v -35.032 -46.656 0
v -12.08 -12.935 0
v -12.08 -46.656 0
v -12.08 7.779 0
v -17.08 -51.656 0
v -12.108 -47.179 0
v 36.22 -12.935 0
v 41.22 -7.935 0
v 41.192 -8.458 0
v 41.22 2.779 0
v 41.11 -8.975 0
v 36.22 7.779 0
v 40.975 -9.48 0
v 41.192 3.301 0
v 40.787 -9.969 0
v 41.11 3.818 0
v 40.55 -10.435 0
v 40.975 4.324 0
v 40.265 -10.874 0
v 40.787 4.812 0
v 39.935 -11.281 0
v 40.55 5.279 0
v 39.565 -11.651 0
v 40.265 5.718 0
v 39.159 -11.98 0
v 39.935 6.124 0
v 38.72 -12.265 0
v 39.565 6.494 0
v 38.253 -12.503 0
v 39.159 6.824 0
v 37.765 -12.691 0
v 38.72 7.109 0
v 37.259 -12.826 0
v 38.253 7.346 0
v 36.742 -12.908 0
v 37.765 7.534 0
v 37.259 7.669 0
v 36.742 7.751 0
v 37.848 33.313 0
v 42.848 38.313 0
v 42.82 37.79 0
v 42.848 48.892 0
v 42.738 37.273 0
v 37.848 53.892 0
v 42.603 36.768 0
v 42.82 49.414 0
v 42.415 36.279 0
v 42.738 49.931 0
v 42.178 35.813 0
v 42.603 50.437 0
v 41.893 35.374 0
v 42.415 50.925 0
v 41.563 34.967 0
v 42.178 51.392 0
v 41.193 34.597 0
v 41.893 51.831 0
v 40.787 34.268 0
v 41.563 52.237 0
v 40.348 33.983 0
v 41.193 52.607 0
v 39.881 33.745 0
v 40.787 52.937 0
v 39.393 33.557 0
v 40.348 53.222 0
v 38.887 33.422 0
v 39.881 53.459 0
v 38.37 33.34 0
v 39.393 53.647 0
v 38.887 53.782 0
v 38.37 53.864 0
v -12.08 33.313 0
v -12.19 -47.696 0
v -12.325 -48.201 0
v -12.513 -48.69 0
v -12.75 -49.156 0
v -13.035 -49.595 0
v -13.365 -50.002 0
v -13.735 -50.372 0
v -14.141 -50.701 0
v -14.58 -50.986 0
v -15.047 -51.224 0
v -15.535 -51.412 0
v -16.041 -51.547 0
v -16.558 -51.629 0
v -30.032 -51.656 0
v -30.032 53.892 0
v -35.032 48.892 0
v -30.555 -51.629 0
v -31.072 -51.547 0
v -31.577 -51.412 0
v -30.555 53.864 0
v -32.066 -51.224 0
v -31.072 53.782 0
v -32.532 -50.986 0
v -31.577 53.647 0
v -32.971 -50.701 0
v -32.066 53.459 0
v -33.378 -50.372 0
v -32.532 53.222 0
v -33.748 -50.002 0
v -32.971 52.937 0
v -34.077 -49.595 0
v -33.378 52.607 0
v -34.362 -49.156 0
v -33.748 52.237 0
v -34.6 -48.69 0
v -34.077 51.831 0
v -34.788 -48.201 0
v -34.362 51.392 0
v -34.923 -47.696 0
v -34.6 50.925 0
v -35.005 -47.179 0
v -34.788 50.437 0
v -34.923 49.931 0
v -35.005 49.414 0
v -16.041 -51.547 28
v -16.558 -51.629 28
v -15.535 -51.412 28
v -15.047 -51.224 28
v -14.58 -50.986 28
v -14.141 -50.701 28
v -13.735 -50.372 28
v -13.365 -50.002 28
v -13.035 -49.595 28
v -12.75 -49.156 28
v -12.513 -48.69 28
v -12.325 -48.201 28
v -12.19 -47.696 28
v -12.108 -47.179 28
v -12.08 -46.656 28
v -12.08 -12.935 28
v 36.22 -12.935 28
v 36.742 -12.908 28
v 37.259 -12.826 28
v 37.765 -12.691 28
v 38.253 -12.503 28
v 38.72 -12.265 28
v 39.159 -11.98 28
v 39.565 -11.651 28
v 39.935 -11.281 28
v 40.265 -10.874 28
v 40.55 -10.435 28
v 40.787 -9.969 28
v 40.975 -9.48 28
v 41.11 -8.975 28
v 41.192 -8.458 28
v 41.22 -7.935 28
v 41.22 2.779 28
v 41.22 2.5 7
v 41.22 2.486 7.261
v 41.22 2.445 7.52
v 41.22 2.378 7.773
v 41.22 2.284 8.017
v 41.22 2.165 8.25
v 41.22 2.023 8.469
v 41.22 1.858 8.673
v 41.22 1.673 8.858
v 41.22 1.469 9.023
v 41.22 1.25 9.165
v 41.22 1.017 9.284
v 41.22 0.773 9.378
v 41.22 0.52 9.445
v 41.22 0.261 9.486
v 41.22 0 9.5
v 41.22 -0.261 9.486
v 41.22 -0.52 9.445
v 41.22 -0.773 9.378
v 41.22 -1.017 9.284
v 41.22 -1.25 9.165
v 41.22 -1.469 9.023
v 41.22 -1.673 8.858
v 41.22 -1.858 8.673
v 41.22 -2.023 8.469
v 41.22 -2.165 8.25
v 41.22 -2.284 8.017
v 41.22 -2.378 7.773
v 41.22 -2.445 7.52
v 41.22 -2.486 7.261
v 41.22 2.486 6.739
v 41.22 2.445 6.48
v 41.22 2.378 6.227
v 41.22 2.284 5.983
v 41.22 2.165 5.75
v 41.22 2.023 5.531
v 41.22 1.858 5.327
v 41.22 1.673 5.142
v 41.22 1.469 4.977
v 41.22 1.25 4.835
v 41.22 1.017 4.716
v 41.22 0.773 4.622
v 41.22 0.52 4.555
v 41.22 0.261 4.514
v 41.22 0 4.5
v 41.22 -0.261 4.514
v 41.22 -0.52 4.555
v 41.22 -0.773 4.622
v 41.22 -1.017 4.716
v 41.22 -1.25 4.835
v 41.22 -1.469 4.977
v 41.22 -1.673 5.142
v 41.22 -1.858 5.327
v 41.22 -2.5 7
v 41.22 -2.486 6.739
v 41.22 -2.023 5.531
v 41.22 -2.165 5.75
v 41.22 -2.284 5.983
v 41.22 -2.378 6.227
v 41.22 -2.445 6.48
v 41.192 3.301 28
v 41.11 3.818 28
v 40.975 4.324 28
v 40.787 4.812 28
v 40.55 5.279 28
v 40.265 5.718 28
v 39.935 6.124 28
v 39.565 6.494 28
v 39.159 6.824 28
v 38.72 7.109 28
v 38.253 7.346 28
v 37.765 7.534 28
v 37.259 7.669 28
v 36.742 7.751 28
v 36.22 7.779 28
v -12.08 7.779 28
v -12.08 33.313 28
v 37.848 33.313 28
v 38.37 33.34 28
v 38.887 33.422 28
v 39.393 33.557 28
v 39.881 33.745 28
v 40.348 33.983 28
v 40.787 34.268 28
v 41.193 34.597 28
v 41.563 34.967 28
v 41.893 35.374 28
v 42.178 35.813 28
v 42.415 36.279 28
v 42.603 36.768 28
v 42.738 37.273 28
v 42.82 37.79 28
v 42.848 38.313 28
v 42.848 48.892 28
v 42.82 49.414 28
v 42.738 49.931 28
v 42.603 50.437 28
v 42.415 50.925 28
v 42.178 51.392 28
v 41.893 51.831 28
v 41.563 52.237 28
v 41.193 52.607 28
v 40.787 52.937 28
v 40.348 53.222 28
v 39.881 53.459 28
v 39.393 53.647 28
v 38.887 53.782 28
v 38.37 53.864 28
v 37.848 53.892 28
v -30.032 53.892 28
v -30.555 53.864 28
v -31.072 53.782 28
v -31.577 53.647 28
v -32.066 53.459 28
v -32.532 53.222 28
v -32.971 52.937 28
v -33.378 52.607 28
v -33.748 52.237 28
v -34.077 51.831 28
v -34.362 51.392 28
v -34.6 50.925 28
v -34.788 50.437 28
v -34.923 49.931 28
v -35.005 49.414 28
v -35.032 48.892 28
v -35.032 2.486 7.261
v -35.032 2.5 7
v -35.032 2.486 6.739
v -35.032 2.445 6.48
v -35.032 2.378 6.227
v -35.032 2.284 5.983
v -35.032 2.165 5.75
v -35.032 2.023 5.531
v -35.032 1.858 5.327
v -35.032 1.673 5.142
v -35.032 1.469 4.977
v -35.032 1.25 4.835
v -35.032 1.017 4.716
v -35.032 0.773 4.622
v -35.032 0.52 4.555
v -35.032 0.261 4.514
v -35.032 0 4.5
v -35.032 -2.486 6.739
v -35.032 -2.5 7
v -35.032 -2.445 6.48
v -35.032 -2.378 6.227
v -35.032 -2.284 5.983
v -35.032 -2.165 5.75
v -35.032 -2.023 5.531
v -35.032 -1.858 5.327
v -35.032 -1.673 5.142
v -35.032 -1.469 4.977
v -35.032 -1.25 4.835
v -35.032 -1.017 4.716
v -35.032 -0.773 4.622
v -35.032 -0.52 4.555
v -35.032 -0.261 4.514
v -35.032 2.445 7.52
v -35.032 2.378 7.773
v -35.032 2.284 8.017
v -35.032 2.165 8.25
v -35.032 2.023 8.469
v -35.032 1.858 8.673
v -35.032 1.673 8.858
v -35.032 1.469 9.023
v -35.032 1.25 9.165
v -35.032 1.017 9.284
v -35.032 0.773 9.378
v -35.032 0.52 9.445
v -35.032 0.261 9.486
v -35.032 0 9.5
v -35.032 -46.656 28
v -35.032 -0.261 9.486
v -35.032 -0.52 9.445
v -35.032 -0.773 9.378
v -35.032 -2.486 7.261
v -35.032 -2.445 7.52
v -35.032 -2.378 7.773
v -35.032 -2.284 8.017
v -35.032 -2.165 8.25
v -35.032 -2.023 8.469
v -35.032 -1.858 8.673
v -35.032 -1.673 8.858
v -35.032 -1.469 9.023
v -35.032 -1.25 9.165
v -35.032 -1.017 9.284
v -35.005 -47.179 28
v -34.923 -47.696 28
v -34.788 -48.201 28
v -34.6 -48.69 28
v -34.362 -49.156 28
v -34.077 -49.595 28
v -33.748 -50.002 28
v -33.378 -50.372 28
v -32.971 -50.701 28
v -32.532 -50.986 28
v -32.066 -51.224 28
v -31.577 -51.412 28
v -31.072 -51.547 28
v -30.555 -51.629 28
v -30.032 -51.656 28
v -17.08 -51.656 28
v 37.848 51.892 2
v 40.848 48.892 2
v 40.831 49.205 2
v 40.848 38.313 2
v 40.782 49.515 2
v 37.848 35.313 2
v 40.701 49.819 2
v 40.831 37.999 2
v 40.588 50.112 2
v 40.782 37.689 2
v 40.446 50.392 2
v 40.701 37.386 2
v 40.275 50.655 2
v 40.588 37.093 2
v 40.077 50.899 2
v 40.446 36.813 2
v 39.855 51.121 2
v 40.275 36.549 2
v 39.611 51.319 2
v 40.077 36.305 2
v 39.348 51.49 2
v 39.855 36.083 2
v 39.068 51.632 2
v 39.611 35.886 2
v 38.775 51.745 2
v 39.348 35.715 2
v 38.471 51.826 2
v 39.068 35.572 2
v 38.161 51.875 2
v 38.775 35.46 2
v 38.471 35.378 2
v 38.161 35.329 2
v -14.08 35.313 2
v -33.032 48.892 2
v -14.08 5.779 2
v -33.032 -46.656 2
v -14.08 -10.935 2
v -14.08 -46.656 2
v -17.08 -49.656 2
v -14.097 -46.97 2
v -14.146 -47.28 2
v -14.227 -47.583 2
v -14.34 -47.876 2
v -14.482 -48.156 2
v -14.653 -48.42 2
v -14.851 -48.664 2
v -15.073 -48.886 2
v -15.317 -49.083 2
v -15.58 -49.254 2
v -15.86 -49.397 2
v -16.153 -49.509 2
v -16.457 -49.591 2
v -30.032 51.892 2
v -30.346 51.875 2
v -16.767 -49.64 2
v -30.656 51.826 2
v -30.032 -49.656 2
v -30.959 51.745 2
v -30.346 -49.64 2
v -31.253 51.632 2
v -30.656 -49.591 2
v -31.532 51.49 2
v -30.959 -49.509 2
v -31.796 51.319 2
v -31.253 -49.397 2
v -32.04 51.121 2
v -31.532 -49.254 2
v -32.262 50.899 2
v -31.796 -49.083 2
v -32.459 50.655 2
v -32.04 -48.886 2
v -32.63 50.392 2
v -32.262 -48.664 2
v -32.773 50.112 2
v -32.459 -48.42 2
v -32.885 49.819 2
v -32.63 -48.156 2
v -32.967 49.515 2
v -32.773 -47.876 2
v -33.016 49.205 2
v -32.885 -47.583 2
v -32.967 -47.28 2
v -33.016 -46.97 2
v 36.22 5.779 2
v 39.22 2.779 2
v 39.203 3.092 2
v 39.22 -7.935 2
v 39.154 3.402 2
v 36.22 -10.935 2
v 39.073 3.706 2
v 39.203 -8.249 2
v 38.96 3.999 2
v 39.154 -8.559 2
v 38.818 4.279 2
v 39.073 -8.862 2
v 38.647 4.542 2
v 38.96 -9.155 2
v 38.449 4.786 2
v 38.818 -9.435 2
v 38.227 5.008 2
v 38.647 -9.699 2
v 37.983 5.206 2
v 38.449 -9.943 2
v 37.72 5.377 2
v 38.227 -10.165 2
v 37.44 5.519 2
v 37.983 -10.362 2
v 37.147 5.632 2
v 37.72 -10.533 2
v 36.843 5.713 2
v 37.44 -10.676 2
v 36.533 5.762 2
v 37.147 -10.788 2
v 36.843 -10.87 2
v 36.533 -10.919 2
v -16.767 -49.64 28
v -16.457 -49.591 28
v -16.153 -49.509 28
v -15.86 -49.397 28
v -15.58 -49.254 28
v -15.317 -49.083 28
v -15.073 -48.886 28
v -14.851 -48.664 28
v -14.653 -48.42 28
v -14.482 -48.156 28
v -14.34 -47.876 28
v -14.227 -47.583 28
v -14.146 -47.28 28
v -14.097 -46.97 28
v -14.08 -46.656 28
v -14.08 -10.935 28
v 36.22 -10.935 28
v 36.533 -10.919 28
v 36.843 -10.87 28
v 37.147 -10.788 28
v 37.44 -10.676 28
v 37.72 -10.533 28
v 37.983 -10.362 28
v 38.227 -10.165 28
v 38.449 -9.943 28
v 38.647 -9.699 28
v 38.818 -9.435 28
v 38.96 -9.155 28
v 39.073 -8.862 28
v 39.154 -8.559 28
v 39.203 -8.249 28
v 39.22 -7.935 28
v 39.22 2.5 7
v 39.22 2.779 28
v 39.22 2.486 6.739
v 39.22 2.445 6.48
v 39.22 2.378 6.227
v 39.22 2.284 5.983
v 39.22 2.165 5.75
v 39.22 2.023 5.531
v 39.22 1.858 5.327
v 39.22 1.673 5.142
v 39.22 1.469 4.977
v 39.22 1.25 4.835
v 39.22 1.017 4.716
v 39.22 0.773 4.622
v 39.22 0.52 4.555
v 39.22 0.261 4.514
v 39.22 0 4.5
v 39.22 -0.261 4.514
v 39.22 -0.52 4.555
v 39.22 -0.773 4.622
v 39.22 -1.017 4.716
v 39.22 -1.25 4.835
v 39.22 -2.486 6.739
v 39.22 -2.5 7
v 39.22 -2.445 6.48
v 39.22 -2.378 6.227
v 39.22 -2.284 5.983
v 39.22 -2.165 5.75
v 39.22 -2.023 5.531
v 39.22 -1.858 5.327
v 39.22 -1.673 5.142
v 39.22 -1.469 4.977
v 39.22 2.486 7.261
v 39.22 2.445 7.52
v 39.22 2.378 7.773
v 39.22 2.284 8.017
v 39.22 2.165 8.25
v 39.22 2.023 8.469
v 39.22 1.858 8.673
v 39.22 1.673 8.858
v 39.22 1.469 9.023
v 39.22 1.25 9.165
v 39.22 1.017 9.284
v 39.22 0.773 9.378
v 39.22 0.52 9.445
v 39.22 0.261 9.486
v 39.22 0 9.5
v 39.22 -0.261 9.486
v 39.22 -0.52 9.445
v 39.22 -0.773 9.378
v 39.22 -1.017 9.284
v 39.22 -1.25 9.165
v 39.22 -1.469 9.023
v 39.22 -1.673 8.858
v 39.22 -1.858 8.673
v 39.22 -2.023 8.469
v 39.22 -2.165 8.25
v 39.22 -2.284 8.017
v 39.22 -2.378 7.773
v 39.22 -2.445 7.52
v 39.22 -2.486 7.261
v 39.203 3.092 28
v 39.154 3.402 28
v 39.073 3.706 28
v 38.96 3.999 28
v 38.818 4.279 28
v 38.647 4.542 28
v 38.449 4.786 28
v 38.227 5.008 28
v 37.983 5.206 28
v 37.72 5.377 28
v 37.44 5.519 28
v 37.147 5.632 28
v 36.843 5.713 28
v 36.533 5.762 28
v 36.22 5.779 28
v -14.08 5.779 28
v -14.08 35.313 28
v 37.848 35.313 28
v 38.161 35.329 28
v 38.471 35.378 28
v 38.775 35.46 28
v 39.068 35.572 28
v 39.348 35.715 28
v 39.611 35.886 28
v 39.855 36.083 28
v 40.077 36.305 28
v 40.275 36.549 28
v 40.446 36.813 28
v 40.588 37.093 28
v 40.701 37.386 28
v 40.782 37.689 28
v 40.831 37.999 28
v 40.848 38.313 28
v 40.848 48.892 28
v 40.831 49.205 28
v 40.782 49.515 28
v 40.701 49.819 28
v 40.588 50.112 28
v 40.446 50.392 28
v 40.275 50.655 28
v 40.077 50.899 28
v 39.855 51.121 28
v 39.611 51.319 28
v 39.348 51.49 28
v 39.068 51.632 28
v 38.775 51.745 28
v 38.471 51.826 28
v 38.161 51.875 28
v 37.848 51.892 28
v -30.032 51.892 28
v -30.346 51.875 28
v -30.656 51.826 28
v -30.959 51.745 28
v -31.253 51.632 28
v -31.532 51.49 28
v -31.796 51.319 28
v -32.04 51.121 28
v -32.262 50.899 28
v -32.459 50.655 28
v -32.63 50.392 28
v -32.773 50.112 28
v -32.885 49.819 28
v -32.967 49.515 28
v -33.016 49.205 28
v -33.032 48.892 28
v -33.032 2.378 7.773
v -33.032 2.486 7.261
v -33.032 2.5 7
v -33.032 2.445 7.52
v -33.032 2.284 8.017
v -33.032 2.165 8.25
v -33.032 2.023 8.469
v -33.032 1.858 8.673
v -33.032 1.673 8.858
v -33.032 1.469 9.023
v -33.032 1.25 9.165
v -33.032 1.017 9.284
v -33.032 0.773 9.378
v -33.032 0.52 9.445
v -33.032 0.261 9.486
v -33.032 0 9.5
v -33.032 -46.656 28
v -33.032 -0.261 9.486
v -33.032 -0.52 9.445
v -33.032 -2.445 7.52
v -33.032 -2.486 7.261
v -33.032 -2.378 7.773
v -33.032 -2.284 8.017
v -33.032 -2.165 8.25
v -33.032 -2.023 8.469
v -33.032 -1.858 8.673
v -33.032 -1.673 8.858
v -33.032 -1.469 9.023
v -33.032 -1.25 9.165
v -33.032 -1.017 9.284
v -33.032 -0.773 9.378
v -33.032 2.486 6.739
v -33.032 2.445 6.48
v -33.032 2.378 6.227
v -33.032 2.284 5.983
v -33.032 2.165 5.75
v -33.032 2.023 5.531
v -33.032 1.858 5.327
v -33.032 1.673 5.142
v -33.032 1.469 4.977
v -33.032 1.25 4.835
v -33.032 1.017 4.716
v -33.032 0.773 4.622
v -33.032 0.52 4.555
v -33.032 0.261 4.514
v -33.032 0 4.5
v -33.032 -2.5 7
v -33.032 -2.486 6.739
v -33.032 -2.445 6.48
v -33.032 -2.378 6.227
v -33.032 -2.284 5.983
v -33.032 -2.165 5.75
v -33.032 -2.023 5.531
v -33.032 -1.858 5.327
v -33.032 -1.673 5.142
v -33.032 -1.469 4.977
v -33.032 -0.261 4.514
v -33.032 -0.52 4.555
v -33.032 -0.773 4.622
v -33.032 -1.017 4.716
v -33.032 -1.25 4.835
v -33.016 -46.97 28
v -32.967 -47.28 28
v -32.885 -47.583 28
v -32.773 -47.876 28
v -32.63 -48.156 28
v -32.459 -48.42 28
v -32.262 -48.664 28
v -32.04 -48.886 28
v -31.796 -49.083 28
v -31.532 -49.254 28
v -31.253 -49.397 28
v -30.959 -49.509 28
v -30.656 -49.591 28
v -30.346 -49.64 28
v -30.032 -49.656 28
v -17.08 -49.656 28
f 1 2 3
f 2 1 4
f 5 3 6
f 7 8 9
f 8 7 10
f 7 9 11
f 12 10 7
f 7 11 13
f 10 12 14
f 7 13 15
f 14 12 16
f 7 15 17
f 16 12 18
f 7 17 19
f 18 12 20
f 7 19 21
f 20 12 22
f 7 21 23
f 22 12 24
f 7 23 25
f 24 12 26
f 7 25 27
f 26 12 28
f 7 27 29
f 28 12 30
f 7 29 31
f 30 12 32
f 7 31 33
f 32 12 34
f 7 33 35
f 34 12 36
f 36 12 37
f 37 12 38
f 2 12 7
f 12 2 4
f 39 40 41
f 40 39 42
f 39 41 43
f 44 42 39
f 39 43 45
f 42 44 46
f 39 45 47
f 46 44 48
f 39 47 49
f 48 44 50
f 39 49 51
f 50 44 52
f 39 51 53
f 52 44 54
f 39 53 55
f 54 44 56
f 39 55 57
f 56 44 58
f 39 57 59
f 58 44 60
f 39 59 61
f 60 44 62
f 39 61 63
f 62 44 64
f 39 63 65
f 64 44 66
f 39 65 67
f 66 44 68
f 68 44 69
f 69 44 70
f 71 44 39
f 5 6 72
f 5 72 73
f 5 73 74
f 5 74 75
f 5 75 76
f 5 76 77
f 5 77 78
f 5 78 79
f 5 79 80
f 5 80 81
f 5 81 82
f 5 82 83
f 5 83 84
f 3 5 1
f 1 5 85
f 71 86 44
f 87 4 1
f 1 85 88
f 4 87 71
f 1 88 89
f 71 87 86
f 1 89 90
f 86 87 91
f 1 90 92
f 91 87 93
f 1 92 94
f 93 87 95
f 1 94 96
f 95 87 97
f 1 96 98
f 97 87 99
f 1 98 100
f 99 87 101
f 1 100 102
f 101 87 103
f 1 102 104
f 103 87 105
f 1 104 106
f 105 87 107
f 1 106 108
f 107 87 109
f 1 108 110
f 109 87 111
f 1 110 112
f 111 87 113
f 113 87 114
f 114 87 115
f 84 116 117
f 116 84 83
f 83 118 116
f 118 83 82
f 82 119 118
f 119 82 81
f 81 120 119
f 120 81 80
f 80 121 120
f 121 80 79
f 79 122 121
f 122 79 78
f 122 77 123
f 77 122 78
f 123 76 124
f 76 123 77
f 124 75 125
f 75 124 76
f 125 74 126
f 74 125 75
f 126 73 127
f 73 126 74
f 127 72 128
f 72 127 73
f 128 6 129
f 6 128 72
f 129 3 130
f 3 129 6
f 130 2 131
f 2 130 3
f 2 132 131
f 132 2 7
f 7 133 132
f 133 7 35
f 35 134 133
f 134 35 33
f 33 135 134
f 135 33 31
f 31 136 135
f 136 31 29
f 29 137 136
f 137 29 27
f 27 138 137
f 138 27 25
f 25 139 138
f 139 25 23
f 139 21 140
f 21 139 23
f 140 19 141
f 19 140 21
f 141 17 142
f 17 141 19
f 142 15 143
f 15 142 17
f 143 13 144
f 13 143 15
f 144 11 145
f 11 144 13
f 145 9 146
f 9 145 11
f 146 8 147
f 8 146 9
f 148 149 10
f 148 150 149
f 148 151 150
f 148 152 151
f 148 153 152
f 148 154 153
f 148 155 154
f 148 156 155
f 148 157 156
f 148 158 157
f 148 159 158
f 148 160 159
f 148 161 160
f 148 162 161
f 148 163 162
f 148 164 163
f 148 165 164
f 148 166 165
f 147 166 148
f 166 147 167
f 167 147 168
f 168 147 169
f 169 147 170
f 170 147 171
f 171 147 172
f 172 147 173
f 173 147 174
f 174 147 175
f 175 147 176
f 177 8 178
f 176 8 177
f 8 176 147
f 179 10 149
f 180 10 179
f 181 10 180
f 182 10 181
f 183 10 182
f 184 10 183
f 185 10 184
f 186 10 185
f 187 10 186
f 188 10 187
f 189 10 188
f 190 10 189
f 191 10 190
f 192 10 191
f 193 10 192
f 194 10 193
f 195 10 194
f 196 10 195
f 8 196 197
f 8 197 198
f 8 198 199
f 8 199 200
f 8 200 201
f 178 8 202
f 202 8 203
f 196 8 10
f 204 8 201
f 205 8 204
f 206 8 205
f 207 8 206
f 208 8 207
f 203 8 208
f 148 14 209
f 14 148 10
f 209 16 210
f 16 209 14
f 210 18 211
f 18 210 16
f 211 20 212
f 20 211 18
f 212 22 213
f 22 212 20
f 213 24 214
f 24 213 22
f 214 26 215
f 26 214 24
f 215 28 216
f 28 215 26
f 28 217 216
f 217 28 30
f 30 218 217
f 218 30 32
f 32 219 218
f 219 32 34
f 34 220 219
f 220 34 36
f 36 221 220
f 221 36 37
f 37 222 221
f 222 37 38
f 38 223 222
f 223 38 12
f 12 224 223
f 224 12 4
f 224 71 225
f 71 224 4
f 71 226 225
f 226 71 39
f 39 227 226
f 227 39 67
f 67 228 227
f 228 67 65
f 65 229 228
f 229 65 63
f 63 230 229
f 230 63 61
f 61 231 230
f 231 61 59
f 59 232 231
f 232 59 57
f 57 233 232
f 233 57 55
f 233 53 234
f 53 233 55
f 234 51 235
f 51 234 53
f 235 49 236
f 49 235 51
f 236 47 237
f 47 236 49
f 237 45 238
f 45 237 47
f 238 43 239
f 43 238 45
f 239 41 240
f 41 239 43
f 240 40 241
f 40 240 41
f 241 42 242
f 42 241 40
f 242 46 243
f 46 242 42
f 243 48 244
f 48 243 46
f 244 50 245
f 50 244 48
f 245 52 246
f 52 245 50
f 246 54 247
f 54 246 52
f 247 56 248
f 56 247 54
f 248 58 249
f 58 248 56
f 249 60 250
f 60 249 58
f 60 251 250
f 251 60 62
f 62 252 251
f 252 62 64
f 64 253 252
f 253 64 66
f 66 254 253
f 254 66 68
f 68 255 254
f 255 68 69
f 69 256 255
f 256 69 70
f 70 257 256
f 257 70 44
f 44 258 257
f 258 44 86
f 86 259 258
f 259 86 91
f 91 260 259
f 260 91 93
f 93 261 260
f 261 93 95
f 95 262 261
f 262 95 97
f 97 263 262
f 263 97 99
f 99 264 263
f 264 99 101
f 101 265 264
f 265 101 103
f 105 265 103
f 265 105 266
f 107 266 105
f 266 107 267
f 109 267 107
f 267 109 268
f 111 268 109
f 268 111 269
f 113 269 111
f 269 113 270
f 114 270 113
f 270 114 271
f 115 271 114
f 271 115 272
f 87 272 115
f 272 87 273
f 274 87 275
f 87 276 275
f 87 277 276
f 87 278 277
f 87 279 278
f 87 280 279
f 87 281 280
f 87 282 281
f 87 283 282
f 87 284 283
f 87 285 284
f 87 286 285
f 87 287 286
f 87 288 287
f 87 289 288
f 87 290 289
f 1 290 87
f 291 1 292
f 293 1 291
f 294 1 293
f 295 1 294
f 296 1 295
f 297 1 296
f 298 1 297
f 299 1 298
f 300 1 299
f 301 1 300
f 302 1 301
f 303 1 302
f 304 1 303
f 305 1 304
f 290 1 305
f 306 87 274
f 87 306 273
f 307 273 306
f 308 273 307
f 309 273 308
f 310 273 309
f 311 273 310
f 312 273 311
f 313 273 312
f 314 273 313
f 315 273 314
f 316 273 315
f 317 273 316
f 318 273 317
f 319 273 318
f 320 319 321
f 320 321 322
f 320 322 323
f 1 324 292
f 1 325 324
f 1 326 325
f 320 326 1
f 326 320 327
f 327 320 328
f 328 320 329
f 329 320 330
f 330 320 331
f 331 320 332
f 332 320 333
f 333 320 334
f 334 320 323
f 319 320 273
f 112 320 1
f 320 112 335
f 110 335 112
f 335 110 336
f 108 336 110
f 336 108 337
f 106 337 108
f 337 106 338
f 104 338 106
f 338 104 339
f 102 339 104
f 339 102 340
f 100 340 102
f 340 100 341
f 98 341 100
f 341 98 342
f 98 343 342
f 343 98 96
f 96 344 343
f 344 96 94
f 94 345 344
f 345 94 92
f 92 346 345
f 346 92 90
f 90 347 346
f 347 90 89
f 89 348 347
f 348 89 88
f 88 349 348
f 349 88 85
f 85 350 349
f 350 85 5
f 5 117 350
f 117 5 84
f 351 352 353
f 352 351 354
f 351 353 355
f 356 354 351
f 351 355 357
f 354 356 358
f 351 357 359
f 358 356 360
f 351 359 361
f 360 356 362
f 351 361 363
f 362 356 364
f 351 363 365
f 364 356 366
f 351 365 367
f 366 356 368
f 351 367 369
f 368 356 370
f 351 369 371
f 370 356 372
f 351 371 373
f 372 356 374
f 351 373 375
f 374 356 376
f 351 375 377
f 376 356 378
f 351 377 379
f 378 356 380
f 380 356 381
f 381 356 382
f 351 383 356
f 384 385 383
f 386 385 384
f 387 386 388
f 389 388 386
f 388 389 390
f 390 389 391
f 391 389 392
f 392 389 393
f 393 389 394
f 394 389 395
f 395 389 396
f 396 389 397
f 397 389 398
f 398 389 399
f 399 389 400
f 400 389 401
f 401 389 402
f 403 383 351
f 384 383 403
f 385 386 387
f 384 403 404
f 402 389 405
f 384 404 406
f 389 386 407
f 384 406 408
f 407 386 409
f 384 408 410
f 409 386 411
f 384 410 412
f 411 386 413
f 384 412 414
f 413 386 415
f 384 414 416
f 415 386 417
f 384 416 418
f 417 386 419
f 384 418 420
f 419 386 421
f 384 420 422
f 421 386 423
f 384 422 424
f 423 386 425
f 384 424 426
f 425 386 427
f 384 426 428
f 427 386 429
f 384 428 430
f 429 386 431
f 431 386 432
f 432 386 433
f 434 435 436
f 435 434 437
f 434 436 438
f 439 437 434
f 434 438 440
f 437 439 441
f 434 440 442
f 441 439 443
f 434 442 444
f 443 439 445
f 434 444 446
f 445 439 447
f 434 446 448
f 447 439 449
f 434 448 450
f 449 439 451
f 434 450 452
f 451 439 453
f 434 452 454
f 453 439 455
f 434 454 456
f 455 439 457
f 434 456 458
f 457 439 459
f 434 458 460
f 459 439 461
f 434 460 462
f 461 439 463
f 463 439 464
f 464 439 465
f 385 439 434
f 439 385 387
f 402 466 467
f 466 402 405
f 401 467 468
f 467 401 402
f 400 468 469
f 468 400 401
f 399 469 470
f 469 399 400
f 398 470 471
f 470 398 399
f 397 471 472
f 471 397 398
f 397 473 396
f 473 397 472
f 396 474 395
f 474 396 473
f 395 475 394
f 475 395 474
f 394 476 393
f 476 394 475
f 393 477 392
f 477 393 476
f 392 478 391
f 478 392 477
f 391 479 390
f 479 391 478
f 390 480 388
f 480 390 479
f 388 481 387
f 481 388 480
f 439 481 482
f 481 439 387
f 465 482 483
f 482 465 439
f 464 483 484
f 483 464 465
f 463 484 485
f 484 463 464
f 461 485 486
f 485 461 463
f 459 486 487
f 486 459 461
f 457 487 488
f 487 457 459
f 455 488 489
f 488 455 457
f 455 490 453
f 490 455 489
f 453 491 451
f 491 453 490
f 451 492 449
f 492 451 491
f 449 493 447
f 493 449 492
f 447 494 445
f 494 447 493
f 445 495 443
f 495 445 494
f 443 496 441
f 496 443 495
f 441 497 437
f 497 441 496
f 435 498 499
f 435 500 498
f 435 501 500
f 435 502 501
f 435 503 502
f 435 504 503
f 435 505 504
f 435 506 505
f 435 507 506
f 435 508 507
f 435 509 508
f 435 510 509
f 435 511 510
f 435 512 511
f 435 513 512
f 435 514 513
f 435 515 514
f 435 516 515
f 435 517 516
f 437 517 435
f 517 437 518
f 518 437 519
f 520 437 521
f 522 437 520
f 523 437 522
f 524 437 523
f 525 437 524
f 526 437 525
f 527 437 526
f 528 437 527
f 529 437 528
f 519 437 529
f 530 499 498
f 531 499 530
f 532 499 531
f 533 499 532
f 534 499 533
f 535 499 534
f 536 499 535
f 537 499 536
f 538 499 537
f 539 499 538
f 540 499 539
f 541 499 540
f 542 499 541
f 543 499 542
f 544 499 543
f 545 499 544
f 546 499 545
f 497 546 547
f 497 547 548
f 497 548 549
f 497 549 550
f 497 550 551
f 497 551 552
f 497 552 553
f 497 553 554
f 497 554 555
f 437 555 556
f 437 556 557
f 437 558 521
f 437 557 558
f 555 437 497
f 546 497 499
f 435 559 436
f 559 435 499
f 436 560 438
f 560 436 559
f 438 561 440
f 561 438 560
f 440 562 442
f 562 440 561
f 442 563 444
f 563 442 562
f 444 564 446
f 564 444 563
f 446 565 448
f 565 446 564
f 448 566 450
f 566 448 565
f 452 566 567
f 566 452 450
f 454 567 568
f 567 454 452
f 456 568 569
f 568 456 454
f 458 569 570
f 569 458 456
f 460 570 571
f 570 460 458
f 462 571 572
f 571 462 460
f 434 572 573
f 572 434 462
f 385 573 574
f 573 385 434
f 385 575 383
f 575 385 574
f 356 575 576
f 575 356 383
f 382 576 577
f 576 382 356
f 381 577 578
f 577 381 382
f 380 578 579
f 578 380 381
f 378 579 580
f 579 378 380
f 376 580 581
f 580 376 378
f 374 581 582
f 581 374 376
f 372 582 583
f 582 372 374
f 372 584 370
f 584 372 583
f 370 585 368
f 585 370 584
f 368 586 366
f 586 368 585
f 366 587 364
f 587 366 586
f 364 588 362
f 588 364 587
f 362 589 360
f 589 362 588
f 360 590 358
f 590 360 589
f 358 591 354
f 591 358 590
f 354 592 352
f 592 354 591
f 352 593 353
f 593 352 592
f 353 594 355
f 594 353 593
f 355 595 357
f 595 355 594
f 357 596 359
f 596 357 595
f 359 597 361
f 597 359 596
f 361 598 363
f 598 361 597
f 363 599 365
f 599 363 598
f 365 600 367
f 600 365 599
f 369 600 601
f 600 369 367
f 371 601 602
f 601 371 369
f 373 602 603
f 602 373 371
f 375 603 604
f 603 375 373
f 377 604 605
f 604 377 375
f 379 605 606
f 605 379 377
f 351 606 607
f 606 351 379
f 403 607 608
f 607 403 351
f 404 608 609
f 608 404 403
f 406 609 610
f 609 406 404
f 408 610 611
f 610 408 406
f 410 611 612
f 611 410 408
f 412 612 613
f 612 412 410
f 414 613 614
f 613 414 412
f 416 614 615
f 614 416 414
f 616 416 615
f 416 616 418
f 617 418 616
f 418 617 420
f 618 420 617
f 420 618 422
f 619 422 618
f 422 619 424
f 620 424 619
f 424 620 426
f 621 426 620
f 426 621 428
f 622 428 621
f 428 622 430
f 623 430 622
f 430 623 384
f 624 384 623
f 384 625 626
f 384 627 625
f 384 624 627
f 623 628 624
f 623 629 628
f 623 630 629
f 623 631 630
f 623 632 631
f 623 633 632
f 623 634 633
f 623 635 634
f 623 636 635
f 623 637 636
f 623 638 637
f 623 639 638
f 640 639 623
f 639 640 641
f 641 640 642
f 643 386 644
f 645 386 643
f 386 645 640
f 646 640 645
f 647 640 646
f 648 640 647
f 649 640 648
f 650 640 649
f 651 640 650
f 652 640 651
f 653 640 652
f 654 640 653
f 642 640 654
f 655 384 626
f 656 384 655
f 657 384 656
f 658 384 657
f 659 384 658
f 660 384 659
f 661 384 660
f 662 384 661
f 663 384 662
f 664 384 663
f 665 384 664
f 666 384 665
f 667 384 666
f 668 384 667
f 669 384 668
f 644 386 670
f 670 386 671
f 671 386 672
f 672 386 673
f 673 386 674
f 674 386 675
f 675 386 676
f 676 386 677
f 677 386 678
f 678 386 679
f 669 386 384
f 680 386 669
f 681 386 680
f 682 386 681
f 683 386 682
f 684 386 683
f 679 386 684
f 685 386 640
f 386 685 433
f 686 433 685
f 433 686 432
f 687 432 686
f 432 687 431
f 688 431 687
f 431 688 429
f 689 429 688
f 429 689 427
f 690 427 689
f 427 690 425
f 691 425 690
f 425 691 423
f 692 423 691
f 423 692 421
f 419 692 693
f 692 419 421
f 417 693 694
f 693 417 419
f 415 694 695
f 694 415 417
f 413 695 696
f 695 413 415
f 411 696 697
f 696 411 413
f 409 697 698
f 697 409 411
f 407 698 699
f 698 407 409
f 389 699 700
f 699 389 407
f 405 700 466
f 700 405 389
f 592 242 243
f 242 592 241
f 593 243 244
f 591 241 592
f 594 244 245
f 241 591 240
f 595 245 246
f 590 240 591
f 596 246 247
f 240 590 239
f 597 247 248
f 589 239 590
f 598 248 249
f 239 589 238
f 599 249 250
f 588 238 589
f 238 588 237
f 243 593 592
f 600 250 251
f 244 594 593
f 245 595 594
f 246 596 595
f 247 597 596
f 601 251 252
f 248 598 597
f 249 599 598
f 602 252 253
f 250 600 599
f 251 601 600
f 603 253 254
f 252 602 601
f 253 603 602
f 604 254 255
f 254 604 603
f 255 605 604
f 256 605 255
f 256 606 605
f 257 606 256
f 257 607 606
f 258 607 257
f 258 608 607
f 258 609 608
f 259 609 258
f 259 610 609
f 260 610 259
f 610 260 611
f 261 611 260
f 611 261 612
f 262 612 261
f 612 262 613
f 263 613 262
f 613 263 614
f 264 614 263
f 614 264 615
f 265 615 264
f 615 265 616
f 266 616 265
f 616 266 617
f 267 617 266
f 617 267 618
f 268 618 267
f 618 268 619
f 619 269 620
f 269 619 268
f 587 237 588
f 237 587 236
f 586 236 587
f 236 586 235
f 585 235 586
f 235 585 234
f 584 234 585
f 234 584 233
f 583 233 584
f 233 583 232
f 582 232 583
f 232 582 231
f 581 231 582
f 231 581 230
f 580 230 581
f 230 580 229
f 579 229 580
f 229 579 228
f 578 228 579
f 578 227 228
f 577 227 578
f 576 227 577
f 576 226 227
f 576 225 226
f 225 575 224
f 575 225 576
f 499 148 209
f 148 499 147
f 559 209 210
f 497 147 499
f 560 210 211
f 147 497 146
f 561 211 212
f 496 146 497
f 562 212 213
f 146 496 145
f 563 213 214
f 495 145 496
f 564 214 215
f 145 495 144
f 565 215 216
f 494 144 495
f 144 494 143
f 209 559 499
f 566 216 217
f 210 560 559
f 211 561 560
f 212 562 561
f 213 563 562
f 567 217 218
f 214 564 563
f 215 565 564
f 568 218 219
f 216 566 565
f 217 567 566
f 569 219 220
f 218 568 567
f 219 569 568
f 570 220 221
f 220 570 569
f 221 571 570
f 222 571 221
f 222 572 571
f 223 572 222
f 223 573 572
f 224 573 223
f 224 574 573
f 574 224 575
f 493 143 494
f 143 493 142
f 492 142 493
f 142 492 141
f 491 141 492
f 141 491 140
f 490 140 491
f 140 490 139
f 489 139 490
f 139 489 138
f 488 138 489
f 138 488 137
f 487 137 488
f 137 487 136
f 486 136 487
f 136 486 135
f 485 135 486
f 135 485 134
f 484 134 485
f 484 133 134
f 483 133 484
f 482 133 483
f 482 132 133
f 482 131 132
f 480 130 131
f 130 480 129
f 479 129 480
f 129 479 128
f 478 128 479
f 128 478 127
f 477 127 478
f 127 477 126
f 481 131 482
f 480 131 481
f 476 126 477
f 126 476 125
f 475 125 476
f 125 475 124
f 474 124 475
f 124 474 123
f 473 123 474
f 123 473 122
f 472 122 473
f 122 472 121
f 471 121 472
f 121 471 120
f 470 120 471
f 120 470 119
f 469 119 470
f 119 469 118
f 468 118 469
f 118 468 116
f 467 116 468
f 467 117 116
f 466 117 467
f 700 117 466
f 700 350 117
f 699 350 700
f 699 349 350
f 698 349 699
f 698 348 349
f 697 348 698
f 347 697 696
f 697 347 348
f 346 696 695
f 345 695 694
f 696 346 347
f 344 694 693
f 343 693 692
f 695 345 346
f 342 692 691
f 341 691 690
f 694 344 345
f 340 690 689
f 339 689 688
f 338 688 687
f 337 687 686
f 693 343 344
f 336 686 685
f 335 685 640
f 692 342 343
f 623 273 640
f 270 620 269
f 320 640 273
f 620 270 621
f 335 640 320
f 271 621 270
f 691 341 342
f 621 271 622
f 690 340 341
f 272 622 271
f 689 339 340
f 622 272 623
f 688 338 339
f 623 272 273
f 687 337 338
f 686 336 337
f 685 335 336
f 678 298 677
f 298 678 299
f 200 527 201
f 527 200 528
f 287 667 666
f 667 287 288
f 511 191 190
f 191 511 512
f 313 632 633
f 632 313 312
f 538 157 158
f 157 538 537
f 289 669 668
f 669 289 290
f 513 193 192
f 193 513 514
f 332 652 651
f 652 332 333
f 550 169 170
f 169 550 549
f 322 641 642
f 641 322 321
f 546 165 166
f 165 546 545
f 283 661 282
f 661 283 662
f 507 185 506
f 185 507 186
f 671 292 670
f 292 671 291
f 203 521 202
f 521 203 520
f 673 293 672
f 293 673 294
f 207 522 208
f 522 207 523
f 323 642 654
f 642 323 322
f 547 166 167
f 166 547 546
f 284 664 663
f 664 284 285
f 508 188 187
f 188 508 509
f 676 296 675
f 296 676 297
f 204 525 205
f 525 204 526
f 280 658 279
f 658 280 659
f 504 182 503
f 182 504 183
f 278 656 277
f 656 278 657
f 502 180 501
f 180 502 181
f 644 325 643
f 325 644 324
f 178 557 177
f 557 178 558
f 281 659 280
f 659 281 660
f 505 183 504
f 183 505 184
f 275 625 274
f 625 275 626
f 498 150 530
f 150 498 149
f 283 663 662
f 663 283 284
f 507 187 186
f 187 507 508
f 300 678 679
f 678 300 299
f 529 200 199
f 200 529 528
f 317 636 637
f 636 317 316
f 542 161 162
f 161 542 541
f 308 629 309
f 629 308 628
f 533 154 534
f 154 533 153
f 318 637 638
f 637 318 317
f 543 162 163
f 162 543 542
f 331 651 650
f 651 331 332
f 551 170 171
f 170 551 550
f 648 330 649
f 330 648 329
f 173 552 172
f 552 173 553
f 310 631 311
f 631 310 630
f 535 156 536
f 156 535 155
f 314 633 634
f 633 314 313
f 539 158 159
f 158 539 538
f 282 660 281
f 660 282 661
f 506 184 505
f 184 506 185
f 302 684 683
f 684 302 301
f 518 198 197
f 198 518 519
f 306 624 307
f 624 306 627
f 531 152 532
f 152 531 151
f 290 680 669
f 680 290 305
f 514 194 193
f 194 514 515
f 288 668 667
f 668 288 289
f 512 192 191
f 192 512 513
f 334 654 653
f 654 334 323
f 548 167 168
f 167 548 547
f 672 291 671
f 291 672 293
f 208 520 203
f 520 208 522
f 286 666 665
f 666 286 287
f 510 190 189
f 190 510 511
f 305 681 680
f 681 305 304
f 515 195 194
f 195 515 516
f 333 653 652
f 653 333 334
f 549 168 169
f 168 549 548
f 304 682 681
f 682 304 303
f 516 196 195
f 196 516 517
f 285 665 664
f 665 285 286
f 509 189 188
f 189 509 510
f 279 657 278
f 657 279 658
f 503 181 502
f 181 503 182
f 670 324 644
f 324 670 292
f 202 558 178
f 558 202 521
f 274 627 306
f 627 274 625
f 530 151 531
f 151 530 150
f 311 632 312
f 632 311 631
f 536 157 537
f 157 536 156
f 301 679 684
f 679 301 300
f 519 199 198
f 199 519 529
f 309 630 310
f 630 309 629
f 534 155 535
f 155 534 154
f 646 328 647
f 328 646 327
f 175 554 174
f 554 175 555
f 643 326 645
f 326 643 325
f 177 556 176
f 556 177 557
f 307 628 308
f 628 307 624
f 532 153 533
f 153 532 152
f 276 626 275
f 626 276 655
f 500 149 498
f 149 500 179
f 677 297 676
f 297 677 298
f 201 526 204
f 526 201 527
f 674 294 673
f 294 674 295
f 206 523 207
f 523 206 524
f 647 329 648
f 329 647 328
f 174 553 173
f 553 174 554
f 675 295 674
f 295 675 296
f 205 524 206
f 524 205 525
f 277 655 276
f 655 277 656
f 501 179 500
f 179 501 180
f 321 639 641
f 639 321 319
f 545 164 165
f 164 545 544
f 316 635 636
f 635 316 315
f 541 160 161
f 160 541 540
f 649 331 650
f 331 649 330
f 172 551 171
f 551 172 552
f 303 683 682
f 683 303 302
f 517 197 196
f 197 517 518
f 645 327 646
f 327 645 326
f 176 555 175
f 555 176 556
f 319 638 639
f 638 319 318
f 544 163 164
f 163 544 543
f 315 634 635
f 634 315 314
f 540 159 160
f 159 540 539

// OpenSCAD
// AUTOMATICALLY GENERATED FILE: Letter_F
// SIGN SCULPTOR ENGINE V2

Render_Mode = "Body"; // Set to "Lid" to export the cover
Letter = "F";
Font_Size = 100;
Font_Name = "Arial:style=Black";
Light_Type = "Silicone_Neon_6mm";

// -- Engineering Constants --
Sign_Height = 30.0;
Wall_Thickness = 2.0;
Base_Thickness = 2.0;
Lid_Tolerance = 0.15;
Hole_Height = 5.0;
Hole_Size = 5.0;

// -- Logic Engine --
CW = (Light_Type == "Silicone_Neon_6mm") ? 6.0 :
     (Light_Type == "Silicone_Neon_8mm") ? 8.0 :
     (Light_Type == "LED_Strip_10mm")    ? 10.5 :
     (Light_Type == "Individual_Pixels")  ? 14.0 : 6.0;

Lip_Overhang = (Light_Type == "Silicone_Neon_6mm" || Light_Type == "Silicone_Neon_8mm") ? 0.4 : 0.0;

$fn = 60;

module letter_shape() {
    text(text=Letter, size=Font_Size, font=Font_Name, halign="center", valign="center");
}

module body_geometry() {
    difference() {
        // 1. Positive Block
        linear_extrude(Sign_Height)
            offset(r = CW/2 + Wall_Thickness)
            letter_shape();

        // 2. Light Channel
        translate([0,0, Base_Thickness])
            linear_extrude(Sign_Height + 1)
            offset(r = CW/2)
            letter_shape();

        // 3. Friction Lip
        if (Lip_Overhang > 0) {
            translate([0,0, Sign_Height - 2.0])
                linear_extrude(3.0)
                difference() {
                    offset(r = CW/2 + 5) letter_shape();
                    offset(r = CW/2 - Lip_Overhang) letter_shape();
                }
        }
        
        // 4. Lid Shelf
        translate([0,0, Sign_Height - 2.0])
            linear_extrude(3.0)
            offset(r = CW/2 + 1.5)
            letter_shape();

        // 5. WIRE CHANNELS (Dynamic Side Holes)
        // Left Hole
        translate([-Font_Size/1.8, 0, Hole_Height + Base_Thickness])
            rotate([0, 90, 0])
            cylinder(h = Font_Size, r = Hole_Size/2);
            
        // Right Hole
        translate([Font_Size/1.8, 0, Hole_Height + Base_Thickness])
            rotate([0, -90, 0])
            cylinder(h = Font_Size, r = Hole_Size/2);
    }
}

module lid_geometry() {
    color("White")
        linear_extrude(2.0)
        offset(r = (CW/2 + 1.5) - Lid_Tolerance)
        letter_shape();
}

// Render Controller
if (Render_Mode == "Body") {
    body_geometry();
} else if (Render_Mode == "Lid") {
    lid_geometry();
}
